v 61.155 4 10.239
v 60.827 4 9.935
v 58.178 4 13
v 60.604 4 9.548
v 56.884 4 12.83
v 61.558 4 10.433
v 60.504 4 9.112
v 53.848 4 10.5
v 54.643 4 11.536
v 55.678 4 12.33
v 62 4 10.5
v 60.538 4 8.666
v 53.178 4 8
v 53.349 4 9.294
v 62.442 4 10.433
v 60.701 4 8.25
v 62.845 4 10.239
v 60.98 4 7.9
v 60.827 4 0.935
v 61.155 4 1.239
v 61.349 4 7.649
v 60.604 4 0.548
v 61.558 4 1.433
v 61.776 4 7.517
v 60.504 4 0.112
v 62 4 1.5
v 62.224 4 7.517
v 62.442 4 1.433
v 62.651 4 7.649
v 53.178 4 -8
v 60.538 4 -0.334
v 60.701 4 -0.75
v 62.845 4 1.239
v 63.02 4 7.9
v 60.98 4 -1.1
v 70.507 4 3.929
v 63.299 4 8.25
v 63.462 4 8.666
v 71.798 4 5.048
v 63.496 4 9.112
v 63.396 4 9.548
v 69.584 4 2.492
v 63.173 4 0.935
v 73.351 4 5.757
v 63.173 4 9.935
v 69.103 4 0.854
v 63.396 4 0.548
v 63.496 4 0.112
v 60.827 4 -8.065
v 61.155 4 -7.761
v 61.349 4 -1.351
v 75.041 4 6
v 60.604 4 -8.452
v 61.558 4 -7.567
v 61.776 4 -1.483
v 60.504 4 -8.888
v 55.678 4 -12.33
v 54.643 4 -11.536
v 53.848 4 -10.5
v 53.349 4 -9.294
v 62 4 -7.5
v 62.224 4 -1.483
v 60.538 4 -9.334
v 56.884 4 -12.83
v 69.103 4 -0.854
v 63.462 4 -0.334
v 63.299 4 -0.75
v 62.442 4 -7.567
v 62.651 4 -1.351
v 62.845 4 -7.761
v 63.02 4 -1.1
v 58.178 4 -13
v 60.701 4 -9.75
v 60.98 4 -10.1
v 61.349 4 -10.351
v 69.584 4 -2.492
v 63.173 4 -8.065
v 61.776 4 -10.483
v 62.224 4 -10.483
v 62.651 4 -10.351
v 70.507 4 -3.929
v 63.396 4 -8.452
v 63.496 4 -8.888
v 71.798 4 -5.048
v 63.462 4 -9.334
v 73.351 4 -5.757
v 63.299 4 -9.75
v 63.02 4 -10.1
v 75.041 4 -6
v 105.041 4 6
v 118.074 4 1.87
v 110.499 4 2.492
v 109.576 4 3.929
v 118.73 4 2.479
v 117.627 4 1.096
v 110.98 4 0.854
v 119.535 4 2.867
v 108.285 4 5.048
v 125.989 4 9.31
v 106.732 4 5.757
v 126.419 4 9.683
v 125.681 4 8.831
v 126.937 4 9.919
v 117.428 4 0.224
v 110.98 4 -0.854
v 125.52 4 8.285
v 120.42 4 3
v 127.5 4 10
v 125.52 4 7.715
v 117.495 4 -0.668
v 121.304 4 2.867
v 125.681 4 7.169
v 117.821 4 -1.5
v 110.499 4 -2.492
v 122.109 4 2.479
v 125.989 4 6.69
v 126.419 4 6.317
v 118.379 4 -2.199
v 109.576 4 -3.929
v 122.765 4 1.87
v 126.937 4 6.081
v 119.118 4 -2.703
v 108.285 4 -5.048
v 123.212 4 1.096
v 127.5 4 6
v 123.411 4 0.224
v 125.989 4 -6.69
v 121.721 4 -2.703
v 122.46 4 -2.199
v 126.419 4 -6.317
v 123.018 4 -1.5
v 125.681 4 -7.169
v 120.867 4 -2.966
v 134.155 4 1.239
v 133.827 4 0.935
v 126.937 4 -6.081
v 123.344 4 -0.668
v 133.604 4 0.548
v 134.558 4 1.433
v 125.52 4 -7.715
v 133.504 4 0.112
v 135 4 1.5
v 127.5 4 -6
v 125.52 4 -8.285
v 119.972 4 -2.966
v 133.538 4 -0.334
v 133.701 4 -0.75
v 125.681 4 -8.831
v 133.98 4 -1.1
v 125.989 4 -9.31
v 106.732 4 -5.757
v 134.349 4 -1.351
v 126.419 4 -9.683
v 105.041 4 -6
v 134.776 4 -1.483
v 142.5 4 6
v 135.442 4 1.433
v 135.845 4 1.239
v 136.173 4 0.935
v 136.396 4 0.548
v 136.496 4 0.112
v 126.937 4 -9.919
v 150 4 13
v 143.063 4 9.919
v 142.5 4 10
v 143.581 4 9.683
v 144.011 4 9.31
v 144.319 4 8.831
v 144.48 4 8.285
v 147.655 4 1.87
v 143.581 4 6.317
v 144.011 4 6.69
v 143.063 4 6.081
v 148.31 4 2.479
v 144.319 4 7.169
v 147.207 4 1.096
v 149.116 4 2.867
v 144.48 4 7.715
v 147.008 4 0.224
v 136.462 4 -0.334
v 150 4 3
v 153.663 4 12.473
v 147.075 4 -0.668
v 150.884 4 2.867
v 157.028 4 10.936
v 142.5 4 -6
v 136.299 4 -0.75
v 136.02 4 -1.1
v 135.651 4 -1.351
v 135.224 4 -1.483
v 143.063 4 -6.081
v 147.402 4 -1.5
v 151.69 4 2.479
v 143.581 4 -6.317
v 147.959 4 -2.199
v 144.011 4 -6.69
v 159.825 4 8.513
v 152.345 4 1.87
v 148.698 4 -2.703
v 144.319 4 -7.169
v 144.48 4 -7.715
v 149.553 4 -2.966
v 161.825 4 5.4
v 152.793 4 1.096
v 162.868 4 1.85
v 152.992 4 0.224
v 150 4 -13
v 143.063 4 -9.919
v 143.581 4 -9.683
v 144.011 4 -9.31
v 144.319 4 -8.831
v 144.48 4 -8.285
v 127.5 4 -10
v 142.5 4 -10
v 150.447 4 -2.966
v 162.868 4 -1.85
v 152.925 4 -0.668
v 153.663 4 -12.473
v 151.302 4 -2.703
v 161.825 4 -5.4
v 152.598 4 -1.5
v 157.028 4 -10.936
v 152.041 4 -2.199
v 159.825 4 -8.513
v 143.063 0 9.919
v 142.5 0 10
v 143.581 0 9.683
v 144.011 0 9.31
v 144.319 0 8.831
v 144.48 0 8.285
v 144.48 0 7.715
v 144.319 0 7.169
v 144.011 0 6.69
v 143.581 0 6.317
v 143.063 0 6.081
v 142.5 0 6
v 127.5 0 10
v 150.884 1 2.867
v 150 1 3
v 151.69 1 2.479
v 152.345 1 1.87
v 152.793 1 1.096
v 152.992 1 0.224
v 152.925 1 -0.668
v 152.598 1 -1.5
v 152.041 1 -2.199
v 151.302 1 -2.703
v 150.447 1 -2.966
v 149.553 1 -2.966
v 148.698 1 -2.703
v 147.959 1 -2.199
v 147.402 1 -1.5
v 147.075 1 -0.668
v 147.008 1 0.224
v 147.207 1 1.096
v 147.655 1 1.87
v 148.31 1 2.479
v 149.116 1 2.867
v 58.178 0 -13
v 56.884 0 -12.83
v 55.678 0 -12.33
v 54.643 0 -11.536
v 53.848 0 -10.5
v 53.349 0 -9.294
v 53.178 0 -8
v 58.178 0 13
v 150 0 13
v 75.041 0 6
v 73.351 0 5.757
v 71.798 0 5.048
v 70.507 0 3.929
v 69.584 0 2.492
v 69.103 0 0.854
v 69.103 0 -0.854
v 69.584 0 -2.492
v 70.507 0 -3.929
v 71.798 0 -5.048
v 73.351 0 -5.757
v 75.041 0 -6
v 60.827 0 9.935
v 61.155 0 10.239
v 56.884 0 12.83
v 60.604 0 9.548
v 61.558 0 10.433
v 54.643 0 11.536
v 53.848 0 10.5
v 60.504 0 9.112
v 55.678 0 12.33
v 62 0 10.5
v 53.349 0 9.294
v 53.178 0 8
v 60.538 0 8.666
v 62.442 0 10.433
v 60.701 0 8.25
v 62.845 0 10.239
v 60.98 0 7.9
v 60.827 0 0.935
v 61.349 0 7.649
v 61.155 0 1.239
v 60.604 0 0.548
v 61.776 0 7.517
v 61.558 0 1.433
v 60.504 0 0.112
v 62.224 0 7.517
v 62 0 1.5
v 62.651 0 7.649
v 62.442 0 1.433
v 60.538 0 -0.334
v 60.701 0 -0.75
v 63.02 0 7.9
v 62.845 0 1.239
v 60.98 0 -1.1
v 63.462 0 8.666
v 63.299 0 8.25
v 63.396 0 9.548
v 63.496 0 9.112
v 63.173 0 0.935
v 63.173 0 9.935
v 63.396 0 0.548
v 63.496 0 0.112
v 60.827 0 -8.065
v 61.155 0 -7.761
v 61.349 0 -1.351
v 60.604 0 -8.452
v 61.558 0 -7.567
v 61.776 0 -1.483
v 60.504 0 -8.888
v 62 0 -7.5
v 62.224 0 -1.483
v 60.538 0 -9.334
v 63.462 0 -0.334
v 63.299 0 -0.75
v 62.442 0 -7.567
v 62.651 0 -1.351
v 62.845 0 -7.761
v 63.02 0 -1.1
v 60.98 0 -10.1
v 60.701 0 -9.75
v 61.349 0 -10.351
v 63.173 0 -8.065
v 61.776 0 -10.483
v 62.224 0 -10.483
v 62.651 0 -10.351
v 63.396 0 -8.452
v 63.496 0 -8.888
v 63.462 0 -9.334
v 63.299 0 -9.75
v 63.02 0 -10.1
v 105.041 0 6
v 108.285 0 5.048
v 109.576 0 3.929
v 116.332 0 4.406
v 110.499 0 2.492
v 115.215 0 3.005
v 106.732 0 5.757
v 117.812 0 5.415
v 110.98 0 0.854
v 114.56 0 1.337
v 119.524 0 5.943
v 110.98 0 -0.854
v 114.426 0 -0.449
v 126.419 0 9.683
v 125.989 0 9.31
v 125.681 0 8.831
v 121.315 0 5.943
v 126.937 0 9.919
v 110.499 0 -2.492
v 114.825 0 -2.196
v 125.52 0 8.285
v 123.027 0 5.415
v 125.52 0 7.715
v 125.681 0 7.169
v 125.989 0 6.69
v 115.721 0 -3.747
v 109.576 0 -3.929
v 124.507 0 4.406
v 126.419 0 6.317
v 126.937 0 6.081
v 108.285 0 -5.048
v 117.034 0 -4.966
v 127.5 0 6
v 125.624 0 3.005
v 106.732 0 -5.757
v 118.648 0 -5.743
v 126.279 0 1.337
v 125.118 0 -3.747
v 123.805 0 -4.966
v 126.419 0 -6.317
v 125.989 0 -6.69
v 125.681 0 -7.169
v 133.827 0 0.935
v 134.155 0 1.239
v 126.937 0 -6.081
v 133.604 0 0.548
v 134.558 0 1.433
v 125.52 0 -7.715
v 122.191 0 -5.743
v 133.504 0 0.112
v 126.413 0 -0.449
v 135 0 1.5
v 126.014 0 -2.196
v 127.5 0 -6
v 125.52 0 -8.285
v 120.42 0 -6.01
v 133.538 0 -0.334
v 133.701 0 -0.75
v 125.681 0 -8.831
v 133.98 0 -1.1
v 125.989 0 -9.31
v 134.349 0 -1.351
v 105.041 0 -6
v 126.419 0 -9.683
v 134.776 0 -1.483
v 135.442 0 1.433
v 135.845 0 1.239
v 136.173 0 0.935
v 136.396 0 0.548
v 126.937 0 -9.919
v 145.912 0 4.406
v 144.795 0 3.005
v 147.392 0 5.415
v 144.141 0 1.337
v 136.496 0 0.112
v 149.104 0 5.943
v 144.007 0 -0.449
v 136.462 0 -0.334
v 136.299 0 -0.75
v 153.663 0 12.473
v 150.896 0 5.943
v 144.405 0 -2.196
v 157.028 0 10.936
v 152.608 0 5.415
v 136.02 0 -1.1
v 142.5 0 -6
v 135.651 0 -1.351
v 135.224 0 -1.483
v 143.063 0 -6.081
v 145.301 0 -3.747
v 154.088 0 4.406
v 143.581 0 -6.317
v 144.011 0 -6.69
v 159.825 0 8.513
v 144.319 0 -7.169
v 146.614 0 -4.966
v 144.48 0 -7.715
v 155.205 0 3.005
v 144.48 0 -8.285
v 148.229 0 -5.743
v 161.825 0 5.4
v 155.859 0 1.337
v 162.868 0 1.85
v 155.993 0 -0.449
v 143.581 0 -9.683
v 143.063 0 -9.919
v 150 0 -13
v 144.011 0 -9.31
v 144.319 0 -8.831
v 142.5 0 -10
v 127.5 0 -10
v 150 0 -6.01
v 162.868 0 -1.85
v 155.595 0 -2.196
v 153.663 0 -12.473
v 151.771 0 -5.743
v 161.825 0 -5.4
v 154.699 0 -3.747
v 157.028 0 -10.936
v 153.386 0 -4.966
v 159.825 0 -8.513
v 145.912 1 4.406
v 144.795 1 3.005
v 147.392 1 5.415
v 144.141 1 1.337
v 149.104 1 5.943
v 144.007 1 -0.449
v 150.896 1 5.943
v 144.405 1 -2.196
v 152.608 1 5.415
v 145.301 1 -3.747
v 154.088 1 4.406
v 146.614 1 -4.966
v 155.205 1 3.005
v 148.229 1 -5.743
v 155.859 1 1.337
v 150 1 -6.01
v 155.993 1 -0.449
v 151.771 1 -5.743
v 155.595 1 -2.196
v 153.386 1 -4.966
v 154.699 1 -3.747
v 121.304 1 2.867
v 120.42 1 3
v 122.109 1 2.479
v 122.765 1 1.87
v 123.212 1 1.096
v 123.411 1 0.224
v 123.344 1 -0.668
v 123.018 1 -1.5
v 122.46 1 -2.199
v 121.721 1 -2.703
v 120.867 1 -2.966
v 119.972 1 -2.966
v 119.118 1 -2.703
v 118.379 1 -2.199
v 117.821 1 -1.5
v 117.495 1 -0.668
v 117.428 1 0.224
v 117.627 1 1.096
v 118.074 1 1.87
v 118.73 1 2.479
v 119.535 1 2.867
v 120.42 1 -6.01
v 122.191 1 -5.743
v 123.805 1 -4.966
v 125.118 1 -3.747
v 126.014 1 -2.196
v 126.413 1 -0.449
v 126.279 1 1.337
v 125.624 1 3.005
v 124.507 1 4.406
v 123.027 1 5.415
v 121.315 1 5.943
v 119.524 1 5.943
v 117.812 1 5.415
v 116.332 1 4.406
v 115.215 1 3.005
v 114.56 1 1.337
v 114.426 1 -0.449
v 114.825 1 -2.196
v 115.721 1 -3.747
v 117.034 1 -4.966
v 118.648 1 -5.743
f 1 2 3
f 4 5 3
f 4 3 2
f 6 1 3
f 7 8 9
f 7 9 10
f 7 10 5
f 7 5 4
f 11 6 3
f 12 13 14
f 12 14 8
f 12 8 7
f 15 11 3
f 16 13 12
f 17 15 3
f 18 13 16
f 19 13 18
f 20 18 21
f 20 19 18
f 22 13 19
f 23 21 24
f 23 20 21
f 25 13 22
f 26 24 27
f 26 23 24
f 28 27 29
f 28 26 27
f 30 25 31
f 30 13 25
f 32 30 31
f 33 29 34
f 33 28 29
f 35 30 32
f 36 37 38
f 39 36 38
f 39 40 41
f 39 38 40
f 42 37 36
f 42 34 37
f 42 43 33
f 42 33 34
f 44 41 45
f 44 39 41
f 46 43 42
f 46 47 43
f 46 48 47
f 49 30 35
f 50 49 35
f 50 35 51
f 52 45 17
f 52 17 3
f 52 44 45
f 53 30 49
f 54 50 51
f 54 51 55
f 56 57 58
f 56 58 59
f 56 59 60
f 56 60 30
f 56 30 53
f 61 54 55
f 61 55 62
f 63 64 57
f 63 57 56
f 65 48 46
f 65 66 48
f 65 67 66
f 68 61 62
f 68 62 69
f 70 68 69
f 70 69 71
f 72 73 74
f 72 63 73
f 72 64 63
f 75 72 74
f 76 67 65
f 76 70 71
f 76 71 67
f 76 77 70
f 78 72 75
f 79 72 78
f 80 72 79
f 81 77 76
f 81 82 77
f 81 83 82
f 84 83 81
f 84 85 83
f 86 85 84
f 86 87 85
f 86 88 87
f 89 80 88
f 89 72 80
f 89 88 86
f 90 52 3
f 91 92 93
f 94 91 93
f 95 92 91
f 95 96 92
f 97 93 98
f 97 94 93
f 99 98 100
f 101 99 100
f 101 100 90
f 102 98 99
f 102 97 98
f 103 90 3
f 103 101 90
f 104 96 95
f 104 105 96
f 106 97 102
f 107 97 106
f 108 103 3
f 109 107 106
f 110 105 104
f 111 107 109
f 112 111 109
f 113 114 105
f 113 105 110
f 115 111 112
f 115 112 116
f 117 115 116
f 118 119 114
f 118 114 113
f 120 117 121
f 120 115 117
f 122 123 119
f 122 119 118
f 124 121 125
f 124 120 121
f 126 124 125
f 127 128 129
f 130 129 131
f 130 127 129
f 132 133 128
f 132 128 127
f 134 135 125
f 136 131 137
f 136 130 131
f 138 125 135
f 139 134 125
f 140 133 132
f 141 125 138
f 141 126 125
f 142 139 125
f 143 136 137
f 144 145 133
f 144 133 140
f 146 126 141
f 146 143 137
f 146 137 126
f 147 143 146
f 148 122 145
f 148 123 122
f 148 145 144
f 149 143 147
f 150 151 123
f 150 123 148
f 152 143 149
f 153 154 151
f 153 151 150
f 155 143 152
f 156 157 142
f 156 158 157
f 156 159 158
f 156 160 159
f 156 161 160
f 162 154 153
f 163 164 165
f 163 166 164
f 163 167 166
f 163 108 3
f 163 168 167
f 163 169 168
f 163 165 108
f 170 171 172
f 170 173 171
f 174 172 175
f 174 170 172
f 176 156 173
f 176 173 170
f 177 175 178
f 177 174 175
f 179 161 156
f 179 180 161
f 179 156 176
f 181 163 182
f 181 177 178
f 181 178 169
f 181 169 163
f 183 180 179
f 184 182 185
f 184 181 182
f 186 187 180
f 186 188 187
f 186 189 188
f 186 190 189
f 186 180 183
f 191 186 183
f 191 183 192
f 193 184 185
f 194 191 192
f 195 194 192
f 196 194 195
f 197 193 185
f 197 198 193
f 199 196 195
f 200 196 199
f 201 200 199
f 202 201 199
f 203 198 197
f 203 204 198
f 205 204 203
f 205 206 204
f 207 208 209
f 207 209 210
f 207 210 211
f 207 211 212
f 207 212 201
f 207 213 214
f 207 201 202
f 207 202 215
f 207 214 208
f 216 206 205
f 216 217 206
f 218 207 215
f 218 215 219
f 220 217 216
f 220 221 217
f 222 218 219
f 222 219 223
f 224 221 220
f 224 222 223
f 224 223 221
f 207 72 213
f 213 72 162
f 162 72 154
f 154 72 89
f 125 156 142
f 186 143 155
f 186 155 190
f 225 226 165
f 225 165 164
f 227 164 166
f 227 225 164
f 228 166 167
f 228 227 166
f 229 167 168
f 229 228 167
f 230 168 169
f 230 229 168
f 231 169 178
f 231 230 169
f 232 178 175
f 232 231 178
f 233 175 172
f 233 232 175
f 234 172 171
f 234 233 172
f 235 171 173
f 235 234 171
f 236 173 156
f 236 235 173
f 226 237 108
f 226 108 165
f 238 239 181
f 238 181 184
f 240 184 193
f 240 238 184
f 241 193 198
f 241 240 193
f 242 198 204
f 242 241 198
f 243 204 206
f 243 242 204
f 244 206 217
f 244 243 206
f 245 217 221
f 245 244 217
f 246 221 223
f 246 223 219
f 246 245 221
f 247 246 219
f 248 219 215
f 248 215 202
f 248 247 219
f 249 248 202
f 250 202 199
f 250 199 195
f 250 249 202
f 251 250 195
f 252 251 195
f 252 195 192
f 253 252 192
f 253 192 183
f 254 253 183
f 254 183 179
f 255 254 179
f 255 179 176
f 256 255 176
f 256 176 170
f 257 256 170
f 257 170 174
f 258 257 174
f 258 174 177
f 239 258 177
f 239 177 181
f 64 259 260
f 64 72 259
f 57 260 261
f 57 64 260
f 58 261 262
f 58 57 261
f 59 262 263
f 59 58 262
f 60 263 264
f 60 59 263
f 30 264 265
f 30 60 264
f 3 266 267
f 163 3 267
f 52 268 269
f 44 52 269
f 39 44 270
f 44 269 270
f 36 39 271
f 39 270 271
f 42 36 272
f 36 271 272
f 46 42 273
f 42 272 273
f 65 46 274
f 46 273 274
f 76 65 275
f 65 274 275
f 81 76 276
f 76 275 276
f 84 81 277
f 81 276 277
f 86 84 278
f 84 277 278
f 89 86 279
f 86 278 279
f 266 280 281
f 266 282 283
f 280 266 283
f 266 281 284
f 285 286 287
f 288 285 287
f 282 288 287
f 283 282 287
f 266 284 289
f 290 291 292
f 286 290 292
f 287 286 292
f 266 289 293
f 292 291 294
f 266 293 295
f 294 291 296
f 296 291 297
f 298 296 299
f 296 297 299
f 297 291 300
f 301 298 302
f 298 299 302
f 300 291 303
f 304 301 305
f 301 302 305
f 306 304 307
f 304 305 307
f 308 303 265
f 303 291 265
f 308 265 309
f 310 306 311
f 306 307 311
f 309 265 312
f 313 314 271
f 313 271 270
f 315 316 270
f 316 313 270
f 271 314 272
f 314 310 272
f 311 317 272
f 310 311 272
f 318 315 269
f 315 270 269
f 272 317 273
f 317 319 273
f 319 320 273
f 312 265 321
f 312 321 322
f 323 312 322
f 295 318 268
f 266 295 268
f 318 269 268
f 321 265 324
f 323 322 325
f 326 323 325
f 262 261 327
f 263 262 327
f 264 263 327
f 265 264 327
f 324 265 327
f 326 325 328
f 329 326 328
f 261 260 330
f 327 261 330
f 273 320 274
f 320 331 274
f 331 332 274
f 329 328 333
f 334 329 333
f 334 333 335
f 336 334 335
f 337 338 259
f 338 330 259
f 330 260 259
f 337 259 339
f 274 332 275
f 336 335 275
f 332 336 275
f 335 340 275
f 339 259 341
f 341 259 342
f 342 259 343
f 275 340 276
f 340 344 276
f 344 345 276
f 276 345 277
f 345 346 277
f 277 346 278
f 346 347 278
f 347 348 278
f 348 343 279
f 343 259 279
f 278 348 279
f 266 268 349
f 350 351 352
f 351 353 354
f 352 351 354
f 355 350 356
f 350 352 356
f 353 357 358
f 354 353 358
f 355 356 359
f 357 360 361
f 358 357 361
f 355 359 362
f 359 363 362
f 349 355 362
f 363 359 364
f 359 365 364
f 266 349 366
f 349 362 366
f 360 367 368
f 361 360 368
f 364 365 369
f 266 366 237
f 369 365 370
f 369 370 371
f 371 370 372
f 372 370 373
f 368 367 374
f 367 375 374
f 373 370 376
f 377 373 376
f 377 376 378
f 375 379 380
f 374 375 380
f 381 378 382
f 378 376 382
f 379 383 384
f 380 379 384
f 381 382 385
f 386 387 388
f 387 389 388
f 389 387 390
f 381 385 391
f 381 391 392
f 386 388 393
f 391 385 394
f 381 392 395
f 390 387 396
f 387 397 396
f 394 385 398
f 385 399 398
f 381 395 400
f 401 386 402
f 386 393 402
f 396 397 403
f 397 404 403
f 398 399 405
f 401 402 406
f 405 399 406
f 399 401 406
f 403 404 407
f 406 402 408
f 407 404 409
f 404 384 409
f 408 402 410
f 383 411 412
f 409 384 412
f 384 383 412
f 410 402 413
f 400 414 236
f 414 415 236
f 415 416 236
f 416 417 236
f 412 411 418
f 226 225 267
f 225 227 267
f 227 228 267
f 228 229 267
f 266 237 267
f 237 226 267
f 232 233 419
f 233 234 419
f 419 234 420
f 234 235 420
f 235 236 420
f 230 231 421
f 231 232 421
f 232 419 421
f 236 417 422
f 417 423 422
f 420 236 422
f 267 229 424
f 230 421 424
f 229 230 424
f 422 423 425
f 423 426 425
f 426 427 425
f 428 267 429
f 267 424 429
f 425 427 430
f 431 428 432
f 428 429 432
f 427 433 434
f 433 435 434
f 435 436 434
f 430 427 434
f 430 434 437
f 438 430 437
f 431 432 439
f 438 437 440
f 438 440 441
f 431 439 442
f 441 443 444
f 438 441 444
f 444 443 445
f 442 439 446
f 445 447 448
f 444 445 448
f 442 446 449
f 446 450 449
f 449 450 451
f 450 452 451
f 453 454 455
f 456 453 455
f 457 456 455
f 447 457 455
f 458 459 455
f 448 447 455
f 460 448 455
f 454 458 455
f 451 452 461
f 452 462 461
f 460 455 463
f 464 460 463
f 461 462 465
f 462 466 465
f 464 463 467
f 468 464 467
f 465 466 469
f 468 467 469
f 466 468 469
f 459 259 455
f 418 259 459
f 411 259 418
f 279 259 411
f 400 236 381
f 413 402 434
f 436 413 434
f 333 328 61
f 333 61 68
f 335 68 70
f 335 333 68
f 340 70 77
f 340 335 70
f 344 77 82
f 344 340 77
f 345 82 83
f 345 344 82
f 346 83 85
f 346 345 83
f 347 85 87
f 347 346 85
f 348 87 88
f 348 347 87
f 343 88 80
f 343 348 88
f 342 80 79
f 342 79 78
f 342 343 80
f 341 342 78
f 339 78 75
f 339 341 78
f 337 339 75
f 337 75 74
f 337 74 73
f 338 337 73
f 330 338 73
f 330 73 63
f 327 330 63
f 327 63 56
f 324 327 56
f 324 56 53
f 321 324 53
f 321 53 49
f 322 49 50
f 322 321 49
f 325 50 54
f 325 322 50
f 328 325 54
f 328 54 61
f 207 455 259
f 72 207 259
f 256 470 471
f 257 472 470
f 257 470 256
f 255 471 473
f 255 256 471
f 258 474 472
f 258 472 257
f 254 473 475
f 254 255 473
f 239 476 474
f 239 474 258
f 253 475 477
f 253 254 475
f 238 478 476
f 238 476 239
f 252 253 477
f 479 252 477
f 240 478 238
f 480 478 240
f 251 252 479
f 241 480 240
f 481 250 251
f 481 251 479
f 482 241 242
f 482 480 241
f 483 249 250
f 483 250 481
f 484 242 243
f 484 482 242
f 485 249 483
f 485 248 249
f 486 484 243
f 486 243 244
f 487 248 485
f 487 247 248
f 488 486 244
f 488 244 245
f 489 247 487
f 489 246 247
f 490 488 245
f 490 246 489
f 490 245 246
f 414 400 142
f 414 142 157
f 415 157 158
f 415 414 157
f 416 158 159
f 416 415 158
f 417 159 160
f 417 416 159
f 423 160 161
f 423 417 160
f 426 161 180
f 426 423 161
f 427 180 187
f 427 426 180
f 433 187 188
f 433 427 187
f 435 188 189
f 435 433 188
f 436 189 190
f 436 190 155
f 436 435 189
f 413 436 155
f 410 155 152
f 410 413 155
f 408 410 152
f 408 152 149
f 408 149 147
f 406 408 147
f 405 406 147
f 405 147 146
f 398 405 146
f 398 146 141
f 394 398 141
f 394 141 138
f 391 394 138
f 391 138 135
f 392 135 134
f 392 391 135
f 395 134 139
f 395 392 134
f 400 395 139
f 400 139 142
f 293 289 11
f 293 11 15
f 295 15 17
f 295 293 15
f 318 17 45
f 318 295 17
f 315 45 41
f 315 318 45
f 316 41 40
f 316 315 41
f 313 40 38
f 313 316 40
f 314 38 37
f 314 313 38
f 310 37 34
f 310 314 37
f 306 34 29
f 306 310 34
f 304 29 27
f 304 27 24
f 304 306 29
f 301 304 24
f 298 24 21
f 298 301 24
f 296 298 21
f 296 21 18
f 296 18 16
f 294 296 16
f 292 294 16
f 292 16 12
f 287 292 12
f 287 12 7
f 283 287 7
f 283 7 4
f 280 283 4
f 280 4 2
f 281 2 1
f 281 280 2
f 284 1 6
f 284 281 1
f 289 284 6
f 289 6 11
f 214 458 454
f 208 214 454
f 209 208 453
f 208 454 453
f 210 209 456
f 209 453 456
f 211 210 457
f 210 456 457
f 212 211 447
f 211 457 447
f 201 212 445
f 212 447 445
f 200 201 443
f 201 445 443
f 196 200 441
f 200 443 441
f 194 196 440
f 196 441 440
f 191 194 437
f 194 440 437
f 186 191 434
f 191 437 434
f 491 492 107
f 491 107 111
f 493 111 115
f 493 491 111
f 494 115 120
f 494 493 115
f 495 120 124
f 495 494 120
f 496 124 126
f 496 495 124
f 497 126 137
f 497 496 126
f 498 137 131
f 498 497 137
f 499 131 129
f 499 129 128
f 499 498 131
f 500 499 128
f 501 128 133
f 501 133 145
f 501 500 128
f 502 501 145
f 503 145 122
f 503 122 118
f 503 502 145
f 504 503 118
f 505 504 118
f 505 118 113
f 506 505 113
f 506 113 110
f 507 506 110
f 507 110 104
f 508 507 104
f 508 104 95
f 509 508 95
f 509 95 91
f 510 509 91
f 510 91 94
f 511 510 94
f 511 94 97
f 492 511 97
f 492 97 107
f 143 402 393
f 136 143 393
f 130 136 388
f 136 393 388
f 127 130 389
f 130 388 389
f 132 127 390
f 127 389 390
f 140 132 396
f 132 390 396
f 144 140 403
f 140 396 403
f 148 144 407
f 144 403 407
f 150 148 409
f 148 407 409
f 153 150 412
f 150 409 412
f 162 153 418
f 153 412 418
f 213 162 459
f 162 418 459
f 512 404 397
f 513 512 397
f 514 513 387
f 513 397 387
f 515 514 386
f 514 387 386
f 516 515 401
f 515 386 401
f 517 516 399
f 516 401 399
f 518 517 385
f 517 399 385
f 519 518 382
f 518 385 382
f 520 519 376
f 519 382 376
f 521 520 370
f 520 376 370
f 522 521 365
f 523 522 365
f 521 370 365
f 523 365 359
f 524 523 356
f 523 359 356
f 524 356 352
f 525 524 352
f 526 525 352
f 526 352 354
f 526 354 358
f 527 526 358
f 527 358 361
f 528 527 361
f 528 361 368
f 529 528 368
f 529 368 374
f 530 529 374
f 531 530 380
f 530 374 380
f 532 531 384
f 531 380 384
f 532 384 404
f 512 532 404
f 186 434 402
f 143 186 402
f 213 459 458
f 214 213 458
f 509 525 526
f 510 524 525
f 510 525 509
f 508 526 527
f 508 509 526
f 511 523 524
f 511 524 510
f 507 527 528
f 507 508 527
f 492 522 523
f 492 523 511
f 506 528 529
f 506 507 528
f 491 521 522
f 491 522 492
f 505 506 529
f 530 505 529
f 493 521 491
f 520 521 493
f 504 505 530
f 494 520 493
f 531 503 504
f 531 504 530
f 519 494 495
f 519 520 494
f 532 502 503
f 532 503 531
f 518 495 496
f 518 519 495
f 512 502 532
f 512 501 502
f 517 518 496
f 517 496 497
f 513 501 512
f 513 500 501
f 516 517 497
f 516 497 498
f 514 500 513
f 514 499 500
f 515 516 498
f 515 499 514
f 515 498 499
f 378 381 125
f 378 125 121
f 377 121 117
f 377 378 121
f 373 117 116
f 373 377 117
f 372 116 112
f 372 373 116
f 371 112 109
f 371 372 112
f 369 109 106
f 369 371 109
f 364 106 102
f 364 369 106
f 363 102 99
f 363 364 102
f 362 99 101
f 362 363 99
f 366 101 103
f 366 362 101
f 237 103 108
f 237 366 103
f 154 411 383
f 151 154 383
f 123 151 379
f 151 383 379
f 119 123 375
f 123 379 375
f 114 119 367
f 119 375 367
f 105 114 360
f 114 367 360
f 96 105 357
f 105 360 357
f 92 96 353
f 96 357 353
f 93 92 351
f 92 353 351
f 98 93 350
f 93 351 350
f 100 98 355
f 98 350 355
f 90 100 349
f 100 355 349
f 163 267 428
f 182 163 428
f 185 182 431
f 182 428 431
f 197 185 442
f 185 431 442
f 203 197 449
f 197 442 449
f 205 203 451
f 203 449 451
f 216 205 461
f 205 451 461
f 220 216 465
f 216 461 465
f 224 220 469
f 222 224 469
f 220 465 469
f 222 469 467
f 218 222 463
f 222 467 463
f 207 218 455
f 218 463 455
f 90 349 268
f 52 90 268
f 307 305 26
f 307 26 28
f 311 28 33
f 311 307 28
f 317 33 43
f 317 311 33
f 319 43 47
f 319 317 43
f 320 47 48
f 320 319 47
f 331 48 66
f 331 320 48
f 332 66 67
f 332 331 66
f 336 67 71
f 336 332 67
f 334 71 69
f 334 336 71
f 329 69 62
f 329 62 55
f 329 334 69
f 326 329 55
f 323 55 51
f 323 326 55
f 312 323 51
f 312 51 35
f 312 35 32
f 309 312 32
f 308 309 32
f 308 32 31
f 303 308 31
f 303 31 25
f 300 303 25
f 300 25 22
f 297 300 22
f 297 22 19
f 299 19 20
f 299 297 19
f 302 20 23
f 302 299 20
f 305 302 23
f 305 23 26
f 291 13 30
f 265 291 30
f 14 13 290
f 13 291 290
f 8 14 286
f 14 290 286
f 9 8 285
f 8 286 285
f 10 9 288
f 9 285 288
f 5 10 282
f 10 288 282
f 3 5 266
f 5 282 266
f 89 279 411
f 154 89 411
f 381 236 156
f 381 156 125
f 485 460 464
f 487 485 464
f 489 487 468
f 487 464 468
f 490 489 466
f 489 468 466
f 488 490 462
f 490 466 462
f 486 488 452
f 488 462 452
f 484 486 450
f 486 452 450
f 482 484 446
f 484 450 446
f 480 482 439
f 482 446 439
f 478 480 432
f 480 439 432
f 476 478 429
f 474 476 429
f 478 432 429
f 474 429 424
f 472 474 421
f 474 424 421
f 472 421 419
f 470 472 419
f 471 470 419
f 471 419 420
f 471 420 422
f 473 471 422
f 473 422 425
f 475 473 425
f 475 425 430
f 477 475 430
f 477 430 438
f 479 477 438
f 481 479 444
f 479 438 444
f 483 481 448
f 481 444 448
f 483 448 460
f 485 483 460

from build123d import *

# Parameters (mm, degrees)
SKETCH_1_R          = 5
SKETCH_1_R_2        = 3
SKETCH_1_R_3        = 1.3
SKETCH_1_R_4        = 1.5
SKETCH_1_W          = 5
SKETCH_1_H          = 10
EXTRUDE_1_DEPTH     = 4
SKETCH_2_R          = 6.01
CUT_EXTRUDE_1_DEPTH = 1
SKETCH_4_W          = 81.277296146
SKETCH_4_H          = 46.186139701
CUT_EXTRUDE_4_DEPTH = 16
FILLET_1_R          = 5


with BuildPart() as part:
    # 草图1 → 凸台-拉伸1 (new body)
    with BuildSketch(Plane(origin=(0, 0, 0), x_dir=(1, 0, 0), z_dir=(0, 1, 0))):
        with BuildLine():
            Line((150, 13), (15.198684154, 13))
            ThreePointArc((15.198684154, 13), (-20, 0), (15.198684154, -13))
            Line((15.198684154, -13), (150, -13))
            ThreePointArc((150, -13), (163, 0), (150, 13))
        make_face()
        with Locations(Location((0, 0, 0), (0, 0, 270))):
            Circle(SKETCH_1_R, mode=Mode.SUBTRACT)
        with Locations(Location((150, 0, 0), (0, 0, 270))):
            Circle(SKETCH_1_R_2, mode=Mode.SUBTRACT)
        with Locations(Location((120.4195, 0, 0), (0, 0, 270))):
            Circle(SKETCH_1_R_2, mode=Mode.SUBTRACT)
        with Locations(Location((0, 9, 0), (0, 0, 270))):
            Circle(SKETCH_1_R_3, mode=Mode.SUBTRACT)
        with Locations(Location((7.794228634, -4.5, 0), (0, 0, 270))):
            Circle(SKETCH_1_R_3, mode=Mode.SUBTRACT)
        with Locations(Location((-7.794228634, -4.5, 0), (0, 0, 270))):
            Circle(SKETCH_1_R_3, mode=Mode.SUBTRACT)
        with Locations(Location((135, 0, 0), (0, 0, 270))):
            Circle(SKETCH_1_R_4, mode=Mode.SUBTRACT)
        with Locations(Location((62, 0, 0), (0, 0, 270))):
            Circle(SKETCH_1_R_4, mode=Mode.SUBTRACT)
        with Locations(Location((62, 9, 0), (0, 0, 270))):
            Circle(SKETCH_1_R_4, mode=Mode.SUBTRACT)
        with Locations(Location((62, -9, 0), (0, 0, 270))):
            Circle(SKETCH_1_R_4, mode=Mode.SUBTRACT)
        with Locations((0, -11.773380776)):
            Rectangle(SKETCH_1_W, SKETCH_1_H, mode=Mode.SUBTRACT)
        with BuildLine():
            Line((105.041482469, -6), (75.041482469, -6))
            ThreePointArc((75.041482469, -6), (69.041482469, 0), (75.041482469, 6))
            Line((75.041482469, 6), (105.041482469, 6))
            ThreePointArc((105.041482469, 6), (111.041482469, 0), (105.041482469, -6))
        make_face(mode=Mode.SUBTRACT)
        with BuildLine():
            Line((142.5, 6), (127.5, 6))
            ThreePointArc((127.5, 6), (125.5, 8), (127.5, 10))
            Line((127.5, 10), (142.5, 10))
            ThreePointArc((142.5, 10), (144.5, 8), (142.5, 6))
        make_face(mode=Mode.SUBTRACT)
        with BuildLine():
            Line((142.5, -6), (127.5, -6))
            ThreePointArc((127.5, -6), (125.5, -8), (127.5, -10))
            Line((127.5, -10), (142.5, -10))
            ThreePointArc((142.5, -10), (144.5, -8), (142.5, -6))
        make_face(mode=Mode.SUBTRACT)
    extrude(amount=EXTRUDE_1_DEPTH)

    # 草图2 → 切除-拉伸1 (cut)
    with BuildSketch(Plane.XZ):
        with Locations(Location((150, 0, 0), (0, 0, 270))):
            Circle(SKETCH_2_R)
        with Locations(Location((120.4195, 0, 0), (0, 0, 270))):
            Circle(SKETCH_2_R)
    extrude(amount=-CUT_EXTRUDE_1_DEPTH, mode=Mode.SUBTRACT)

    # 草图4 → 切除-拉伸4 (cut)
    with BuildSketch(Plane(origin=(0, 4, 0), x_dir=(1, 0, 0), z_dir=(0, 1, 0))):
        with Locations((12.539593114, -0.049090765)):
            Rectangle(SKETCH_4_W, SKETCH_4_H)
    extrude(amount=-CUT_EXTRUDE_4_DEPTH, mode=Mode.SUBTRACT)

    # 圆角1
    fillet_1_edges = [part.edges().sort_by_distance(p)[0] for p in [
        (53.178241187, 2, 13),
        (53.178241187, 2, -13),
    ]]
    fillet(fillet_1_edges, radius=FILLET_1_R)


solid = part.part
